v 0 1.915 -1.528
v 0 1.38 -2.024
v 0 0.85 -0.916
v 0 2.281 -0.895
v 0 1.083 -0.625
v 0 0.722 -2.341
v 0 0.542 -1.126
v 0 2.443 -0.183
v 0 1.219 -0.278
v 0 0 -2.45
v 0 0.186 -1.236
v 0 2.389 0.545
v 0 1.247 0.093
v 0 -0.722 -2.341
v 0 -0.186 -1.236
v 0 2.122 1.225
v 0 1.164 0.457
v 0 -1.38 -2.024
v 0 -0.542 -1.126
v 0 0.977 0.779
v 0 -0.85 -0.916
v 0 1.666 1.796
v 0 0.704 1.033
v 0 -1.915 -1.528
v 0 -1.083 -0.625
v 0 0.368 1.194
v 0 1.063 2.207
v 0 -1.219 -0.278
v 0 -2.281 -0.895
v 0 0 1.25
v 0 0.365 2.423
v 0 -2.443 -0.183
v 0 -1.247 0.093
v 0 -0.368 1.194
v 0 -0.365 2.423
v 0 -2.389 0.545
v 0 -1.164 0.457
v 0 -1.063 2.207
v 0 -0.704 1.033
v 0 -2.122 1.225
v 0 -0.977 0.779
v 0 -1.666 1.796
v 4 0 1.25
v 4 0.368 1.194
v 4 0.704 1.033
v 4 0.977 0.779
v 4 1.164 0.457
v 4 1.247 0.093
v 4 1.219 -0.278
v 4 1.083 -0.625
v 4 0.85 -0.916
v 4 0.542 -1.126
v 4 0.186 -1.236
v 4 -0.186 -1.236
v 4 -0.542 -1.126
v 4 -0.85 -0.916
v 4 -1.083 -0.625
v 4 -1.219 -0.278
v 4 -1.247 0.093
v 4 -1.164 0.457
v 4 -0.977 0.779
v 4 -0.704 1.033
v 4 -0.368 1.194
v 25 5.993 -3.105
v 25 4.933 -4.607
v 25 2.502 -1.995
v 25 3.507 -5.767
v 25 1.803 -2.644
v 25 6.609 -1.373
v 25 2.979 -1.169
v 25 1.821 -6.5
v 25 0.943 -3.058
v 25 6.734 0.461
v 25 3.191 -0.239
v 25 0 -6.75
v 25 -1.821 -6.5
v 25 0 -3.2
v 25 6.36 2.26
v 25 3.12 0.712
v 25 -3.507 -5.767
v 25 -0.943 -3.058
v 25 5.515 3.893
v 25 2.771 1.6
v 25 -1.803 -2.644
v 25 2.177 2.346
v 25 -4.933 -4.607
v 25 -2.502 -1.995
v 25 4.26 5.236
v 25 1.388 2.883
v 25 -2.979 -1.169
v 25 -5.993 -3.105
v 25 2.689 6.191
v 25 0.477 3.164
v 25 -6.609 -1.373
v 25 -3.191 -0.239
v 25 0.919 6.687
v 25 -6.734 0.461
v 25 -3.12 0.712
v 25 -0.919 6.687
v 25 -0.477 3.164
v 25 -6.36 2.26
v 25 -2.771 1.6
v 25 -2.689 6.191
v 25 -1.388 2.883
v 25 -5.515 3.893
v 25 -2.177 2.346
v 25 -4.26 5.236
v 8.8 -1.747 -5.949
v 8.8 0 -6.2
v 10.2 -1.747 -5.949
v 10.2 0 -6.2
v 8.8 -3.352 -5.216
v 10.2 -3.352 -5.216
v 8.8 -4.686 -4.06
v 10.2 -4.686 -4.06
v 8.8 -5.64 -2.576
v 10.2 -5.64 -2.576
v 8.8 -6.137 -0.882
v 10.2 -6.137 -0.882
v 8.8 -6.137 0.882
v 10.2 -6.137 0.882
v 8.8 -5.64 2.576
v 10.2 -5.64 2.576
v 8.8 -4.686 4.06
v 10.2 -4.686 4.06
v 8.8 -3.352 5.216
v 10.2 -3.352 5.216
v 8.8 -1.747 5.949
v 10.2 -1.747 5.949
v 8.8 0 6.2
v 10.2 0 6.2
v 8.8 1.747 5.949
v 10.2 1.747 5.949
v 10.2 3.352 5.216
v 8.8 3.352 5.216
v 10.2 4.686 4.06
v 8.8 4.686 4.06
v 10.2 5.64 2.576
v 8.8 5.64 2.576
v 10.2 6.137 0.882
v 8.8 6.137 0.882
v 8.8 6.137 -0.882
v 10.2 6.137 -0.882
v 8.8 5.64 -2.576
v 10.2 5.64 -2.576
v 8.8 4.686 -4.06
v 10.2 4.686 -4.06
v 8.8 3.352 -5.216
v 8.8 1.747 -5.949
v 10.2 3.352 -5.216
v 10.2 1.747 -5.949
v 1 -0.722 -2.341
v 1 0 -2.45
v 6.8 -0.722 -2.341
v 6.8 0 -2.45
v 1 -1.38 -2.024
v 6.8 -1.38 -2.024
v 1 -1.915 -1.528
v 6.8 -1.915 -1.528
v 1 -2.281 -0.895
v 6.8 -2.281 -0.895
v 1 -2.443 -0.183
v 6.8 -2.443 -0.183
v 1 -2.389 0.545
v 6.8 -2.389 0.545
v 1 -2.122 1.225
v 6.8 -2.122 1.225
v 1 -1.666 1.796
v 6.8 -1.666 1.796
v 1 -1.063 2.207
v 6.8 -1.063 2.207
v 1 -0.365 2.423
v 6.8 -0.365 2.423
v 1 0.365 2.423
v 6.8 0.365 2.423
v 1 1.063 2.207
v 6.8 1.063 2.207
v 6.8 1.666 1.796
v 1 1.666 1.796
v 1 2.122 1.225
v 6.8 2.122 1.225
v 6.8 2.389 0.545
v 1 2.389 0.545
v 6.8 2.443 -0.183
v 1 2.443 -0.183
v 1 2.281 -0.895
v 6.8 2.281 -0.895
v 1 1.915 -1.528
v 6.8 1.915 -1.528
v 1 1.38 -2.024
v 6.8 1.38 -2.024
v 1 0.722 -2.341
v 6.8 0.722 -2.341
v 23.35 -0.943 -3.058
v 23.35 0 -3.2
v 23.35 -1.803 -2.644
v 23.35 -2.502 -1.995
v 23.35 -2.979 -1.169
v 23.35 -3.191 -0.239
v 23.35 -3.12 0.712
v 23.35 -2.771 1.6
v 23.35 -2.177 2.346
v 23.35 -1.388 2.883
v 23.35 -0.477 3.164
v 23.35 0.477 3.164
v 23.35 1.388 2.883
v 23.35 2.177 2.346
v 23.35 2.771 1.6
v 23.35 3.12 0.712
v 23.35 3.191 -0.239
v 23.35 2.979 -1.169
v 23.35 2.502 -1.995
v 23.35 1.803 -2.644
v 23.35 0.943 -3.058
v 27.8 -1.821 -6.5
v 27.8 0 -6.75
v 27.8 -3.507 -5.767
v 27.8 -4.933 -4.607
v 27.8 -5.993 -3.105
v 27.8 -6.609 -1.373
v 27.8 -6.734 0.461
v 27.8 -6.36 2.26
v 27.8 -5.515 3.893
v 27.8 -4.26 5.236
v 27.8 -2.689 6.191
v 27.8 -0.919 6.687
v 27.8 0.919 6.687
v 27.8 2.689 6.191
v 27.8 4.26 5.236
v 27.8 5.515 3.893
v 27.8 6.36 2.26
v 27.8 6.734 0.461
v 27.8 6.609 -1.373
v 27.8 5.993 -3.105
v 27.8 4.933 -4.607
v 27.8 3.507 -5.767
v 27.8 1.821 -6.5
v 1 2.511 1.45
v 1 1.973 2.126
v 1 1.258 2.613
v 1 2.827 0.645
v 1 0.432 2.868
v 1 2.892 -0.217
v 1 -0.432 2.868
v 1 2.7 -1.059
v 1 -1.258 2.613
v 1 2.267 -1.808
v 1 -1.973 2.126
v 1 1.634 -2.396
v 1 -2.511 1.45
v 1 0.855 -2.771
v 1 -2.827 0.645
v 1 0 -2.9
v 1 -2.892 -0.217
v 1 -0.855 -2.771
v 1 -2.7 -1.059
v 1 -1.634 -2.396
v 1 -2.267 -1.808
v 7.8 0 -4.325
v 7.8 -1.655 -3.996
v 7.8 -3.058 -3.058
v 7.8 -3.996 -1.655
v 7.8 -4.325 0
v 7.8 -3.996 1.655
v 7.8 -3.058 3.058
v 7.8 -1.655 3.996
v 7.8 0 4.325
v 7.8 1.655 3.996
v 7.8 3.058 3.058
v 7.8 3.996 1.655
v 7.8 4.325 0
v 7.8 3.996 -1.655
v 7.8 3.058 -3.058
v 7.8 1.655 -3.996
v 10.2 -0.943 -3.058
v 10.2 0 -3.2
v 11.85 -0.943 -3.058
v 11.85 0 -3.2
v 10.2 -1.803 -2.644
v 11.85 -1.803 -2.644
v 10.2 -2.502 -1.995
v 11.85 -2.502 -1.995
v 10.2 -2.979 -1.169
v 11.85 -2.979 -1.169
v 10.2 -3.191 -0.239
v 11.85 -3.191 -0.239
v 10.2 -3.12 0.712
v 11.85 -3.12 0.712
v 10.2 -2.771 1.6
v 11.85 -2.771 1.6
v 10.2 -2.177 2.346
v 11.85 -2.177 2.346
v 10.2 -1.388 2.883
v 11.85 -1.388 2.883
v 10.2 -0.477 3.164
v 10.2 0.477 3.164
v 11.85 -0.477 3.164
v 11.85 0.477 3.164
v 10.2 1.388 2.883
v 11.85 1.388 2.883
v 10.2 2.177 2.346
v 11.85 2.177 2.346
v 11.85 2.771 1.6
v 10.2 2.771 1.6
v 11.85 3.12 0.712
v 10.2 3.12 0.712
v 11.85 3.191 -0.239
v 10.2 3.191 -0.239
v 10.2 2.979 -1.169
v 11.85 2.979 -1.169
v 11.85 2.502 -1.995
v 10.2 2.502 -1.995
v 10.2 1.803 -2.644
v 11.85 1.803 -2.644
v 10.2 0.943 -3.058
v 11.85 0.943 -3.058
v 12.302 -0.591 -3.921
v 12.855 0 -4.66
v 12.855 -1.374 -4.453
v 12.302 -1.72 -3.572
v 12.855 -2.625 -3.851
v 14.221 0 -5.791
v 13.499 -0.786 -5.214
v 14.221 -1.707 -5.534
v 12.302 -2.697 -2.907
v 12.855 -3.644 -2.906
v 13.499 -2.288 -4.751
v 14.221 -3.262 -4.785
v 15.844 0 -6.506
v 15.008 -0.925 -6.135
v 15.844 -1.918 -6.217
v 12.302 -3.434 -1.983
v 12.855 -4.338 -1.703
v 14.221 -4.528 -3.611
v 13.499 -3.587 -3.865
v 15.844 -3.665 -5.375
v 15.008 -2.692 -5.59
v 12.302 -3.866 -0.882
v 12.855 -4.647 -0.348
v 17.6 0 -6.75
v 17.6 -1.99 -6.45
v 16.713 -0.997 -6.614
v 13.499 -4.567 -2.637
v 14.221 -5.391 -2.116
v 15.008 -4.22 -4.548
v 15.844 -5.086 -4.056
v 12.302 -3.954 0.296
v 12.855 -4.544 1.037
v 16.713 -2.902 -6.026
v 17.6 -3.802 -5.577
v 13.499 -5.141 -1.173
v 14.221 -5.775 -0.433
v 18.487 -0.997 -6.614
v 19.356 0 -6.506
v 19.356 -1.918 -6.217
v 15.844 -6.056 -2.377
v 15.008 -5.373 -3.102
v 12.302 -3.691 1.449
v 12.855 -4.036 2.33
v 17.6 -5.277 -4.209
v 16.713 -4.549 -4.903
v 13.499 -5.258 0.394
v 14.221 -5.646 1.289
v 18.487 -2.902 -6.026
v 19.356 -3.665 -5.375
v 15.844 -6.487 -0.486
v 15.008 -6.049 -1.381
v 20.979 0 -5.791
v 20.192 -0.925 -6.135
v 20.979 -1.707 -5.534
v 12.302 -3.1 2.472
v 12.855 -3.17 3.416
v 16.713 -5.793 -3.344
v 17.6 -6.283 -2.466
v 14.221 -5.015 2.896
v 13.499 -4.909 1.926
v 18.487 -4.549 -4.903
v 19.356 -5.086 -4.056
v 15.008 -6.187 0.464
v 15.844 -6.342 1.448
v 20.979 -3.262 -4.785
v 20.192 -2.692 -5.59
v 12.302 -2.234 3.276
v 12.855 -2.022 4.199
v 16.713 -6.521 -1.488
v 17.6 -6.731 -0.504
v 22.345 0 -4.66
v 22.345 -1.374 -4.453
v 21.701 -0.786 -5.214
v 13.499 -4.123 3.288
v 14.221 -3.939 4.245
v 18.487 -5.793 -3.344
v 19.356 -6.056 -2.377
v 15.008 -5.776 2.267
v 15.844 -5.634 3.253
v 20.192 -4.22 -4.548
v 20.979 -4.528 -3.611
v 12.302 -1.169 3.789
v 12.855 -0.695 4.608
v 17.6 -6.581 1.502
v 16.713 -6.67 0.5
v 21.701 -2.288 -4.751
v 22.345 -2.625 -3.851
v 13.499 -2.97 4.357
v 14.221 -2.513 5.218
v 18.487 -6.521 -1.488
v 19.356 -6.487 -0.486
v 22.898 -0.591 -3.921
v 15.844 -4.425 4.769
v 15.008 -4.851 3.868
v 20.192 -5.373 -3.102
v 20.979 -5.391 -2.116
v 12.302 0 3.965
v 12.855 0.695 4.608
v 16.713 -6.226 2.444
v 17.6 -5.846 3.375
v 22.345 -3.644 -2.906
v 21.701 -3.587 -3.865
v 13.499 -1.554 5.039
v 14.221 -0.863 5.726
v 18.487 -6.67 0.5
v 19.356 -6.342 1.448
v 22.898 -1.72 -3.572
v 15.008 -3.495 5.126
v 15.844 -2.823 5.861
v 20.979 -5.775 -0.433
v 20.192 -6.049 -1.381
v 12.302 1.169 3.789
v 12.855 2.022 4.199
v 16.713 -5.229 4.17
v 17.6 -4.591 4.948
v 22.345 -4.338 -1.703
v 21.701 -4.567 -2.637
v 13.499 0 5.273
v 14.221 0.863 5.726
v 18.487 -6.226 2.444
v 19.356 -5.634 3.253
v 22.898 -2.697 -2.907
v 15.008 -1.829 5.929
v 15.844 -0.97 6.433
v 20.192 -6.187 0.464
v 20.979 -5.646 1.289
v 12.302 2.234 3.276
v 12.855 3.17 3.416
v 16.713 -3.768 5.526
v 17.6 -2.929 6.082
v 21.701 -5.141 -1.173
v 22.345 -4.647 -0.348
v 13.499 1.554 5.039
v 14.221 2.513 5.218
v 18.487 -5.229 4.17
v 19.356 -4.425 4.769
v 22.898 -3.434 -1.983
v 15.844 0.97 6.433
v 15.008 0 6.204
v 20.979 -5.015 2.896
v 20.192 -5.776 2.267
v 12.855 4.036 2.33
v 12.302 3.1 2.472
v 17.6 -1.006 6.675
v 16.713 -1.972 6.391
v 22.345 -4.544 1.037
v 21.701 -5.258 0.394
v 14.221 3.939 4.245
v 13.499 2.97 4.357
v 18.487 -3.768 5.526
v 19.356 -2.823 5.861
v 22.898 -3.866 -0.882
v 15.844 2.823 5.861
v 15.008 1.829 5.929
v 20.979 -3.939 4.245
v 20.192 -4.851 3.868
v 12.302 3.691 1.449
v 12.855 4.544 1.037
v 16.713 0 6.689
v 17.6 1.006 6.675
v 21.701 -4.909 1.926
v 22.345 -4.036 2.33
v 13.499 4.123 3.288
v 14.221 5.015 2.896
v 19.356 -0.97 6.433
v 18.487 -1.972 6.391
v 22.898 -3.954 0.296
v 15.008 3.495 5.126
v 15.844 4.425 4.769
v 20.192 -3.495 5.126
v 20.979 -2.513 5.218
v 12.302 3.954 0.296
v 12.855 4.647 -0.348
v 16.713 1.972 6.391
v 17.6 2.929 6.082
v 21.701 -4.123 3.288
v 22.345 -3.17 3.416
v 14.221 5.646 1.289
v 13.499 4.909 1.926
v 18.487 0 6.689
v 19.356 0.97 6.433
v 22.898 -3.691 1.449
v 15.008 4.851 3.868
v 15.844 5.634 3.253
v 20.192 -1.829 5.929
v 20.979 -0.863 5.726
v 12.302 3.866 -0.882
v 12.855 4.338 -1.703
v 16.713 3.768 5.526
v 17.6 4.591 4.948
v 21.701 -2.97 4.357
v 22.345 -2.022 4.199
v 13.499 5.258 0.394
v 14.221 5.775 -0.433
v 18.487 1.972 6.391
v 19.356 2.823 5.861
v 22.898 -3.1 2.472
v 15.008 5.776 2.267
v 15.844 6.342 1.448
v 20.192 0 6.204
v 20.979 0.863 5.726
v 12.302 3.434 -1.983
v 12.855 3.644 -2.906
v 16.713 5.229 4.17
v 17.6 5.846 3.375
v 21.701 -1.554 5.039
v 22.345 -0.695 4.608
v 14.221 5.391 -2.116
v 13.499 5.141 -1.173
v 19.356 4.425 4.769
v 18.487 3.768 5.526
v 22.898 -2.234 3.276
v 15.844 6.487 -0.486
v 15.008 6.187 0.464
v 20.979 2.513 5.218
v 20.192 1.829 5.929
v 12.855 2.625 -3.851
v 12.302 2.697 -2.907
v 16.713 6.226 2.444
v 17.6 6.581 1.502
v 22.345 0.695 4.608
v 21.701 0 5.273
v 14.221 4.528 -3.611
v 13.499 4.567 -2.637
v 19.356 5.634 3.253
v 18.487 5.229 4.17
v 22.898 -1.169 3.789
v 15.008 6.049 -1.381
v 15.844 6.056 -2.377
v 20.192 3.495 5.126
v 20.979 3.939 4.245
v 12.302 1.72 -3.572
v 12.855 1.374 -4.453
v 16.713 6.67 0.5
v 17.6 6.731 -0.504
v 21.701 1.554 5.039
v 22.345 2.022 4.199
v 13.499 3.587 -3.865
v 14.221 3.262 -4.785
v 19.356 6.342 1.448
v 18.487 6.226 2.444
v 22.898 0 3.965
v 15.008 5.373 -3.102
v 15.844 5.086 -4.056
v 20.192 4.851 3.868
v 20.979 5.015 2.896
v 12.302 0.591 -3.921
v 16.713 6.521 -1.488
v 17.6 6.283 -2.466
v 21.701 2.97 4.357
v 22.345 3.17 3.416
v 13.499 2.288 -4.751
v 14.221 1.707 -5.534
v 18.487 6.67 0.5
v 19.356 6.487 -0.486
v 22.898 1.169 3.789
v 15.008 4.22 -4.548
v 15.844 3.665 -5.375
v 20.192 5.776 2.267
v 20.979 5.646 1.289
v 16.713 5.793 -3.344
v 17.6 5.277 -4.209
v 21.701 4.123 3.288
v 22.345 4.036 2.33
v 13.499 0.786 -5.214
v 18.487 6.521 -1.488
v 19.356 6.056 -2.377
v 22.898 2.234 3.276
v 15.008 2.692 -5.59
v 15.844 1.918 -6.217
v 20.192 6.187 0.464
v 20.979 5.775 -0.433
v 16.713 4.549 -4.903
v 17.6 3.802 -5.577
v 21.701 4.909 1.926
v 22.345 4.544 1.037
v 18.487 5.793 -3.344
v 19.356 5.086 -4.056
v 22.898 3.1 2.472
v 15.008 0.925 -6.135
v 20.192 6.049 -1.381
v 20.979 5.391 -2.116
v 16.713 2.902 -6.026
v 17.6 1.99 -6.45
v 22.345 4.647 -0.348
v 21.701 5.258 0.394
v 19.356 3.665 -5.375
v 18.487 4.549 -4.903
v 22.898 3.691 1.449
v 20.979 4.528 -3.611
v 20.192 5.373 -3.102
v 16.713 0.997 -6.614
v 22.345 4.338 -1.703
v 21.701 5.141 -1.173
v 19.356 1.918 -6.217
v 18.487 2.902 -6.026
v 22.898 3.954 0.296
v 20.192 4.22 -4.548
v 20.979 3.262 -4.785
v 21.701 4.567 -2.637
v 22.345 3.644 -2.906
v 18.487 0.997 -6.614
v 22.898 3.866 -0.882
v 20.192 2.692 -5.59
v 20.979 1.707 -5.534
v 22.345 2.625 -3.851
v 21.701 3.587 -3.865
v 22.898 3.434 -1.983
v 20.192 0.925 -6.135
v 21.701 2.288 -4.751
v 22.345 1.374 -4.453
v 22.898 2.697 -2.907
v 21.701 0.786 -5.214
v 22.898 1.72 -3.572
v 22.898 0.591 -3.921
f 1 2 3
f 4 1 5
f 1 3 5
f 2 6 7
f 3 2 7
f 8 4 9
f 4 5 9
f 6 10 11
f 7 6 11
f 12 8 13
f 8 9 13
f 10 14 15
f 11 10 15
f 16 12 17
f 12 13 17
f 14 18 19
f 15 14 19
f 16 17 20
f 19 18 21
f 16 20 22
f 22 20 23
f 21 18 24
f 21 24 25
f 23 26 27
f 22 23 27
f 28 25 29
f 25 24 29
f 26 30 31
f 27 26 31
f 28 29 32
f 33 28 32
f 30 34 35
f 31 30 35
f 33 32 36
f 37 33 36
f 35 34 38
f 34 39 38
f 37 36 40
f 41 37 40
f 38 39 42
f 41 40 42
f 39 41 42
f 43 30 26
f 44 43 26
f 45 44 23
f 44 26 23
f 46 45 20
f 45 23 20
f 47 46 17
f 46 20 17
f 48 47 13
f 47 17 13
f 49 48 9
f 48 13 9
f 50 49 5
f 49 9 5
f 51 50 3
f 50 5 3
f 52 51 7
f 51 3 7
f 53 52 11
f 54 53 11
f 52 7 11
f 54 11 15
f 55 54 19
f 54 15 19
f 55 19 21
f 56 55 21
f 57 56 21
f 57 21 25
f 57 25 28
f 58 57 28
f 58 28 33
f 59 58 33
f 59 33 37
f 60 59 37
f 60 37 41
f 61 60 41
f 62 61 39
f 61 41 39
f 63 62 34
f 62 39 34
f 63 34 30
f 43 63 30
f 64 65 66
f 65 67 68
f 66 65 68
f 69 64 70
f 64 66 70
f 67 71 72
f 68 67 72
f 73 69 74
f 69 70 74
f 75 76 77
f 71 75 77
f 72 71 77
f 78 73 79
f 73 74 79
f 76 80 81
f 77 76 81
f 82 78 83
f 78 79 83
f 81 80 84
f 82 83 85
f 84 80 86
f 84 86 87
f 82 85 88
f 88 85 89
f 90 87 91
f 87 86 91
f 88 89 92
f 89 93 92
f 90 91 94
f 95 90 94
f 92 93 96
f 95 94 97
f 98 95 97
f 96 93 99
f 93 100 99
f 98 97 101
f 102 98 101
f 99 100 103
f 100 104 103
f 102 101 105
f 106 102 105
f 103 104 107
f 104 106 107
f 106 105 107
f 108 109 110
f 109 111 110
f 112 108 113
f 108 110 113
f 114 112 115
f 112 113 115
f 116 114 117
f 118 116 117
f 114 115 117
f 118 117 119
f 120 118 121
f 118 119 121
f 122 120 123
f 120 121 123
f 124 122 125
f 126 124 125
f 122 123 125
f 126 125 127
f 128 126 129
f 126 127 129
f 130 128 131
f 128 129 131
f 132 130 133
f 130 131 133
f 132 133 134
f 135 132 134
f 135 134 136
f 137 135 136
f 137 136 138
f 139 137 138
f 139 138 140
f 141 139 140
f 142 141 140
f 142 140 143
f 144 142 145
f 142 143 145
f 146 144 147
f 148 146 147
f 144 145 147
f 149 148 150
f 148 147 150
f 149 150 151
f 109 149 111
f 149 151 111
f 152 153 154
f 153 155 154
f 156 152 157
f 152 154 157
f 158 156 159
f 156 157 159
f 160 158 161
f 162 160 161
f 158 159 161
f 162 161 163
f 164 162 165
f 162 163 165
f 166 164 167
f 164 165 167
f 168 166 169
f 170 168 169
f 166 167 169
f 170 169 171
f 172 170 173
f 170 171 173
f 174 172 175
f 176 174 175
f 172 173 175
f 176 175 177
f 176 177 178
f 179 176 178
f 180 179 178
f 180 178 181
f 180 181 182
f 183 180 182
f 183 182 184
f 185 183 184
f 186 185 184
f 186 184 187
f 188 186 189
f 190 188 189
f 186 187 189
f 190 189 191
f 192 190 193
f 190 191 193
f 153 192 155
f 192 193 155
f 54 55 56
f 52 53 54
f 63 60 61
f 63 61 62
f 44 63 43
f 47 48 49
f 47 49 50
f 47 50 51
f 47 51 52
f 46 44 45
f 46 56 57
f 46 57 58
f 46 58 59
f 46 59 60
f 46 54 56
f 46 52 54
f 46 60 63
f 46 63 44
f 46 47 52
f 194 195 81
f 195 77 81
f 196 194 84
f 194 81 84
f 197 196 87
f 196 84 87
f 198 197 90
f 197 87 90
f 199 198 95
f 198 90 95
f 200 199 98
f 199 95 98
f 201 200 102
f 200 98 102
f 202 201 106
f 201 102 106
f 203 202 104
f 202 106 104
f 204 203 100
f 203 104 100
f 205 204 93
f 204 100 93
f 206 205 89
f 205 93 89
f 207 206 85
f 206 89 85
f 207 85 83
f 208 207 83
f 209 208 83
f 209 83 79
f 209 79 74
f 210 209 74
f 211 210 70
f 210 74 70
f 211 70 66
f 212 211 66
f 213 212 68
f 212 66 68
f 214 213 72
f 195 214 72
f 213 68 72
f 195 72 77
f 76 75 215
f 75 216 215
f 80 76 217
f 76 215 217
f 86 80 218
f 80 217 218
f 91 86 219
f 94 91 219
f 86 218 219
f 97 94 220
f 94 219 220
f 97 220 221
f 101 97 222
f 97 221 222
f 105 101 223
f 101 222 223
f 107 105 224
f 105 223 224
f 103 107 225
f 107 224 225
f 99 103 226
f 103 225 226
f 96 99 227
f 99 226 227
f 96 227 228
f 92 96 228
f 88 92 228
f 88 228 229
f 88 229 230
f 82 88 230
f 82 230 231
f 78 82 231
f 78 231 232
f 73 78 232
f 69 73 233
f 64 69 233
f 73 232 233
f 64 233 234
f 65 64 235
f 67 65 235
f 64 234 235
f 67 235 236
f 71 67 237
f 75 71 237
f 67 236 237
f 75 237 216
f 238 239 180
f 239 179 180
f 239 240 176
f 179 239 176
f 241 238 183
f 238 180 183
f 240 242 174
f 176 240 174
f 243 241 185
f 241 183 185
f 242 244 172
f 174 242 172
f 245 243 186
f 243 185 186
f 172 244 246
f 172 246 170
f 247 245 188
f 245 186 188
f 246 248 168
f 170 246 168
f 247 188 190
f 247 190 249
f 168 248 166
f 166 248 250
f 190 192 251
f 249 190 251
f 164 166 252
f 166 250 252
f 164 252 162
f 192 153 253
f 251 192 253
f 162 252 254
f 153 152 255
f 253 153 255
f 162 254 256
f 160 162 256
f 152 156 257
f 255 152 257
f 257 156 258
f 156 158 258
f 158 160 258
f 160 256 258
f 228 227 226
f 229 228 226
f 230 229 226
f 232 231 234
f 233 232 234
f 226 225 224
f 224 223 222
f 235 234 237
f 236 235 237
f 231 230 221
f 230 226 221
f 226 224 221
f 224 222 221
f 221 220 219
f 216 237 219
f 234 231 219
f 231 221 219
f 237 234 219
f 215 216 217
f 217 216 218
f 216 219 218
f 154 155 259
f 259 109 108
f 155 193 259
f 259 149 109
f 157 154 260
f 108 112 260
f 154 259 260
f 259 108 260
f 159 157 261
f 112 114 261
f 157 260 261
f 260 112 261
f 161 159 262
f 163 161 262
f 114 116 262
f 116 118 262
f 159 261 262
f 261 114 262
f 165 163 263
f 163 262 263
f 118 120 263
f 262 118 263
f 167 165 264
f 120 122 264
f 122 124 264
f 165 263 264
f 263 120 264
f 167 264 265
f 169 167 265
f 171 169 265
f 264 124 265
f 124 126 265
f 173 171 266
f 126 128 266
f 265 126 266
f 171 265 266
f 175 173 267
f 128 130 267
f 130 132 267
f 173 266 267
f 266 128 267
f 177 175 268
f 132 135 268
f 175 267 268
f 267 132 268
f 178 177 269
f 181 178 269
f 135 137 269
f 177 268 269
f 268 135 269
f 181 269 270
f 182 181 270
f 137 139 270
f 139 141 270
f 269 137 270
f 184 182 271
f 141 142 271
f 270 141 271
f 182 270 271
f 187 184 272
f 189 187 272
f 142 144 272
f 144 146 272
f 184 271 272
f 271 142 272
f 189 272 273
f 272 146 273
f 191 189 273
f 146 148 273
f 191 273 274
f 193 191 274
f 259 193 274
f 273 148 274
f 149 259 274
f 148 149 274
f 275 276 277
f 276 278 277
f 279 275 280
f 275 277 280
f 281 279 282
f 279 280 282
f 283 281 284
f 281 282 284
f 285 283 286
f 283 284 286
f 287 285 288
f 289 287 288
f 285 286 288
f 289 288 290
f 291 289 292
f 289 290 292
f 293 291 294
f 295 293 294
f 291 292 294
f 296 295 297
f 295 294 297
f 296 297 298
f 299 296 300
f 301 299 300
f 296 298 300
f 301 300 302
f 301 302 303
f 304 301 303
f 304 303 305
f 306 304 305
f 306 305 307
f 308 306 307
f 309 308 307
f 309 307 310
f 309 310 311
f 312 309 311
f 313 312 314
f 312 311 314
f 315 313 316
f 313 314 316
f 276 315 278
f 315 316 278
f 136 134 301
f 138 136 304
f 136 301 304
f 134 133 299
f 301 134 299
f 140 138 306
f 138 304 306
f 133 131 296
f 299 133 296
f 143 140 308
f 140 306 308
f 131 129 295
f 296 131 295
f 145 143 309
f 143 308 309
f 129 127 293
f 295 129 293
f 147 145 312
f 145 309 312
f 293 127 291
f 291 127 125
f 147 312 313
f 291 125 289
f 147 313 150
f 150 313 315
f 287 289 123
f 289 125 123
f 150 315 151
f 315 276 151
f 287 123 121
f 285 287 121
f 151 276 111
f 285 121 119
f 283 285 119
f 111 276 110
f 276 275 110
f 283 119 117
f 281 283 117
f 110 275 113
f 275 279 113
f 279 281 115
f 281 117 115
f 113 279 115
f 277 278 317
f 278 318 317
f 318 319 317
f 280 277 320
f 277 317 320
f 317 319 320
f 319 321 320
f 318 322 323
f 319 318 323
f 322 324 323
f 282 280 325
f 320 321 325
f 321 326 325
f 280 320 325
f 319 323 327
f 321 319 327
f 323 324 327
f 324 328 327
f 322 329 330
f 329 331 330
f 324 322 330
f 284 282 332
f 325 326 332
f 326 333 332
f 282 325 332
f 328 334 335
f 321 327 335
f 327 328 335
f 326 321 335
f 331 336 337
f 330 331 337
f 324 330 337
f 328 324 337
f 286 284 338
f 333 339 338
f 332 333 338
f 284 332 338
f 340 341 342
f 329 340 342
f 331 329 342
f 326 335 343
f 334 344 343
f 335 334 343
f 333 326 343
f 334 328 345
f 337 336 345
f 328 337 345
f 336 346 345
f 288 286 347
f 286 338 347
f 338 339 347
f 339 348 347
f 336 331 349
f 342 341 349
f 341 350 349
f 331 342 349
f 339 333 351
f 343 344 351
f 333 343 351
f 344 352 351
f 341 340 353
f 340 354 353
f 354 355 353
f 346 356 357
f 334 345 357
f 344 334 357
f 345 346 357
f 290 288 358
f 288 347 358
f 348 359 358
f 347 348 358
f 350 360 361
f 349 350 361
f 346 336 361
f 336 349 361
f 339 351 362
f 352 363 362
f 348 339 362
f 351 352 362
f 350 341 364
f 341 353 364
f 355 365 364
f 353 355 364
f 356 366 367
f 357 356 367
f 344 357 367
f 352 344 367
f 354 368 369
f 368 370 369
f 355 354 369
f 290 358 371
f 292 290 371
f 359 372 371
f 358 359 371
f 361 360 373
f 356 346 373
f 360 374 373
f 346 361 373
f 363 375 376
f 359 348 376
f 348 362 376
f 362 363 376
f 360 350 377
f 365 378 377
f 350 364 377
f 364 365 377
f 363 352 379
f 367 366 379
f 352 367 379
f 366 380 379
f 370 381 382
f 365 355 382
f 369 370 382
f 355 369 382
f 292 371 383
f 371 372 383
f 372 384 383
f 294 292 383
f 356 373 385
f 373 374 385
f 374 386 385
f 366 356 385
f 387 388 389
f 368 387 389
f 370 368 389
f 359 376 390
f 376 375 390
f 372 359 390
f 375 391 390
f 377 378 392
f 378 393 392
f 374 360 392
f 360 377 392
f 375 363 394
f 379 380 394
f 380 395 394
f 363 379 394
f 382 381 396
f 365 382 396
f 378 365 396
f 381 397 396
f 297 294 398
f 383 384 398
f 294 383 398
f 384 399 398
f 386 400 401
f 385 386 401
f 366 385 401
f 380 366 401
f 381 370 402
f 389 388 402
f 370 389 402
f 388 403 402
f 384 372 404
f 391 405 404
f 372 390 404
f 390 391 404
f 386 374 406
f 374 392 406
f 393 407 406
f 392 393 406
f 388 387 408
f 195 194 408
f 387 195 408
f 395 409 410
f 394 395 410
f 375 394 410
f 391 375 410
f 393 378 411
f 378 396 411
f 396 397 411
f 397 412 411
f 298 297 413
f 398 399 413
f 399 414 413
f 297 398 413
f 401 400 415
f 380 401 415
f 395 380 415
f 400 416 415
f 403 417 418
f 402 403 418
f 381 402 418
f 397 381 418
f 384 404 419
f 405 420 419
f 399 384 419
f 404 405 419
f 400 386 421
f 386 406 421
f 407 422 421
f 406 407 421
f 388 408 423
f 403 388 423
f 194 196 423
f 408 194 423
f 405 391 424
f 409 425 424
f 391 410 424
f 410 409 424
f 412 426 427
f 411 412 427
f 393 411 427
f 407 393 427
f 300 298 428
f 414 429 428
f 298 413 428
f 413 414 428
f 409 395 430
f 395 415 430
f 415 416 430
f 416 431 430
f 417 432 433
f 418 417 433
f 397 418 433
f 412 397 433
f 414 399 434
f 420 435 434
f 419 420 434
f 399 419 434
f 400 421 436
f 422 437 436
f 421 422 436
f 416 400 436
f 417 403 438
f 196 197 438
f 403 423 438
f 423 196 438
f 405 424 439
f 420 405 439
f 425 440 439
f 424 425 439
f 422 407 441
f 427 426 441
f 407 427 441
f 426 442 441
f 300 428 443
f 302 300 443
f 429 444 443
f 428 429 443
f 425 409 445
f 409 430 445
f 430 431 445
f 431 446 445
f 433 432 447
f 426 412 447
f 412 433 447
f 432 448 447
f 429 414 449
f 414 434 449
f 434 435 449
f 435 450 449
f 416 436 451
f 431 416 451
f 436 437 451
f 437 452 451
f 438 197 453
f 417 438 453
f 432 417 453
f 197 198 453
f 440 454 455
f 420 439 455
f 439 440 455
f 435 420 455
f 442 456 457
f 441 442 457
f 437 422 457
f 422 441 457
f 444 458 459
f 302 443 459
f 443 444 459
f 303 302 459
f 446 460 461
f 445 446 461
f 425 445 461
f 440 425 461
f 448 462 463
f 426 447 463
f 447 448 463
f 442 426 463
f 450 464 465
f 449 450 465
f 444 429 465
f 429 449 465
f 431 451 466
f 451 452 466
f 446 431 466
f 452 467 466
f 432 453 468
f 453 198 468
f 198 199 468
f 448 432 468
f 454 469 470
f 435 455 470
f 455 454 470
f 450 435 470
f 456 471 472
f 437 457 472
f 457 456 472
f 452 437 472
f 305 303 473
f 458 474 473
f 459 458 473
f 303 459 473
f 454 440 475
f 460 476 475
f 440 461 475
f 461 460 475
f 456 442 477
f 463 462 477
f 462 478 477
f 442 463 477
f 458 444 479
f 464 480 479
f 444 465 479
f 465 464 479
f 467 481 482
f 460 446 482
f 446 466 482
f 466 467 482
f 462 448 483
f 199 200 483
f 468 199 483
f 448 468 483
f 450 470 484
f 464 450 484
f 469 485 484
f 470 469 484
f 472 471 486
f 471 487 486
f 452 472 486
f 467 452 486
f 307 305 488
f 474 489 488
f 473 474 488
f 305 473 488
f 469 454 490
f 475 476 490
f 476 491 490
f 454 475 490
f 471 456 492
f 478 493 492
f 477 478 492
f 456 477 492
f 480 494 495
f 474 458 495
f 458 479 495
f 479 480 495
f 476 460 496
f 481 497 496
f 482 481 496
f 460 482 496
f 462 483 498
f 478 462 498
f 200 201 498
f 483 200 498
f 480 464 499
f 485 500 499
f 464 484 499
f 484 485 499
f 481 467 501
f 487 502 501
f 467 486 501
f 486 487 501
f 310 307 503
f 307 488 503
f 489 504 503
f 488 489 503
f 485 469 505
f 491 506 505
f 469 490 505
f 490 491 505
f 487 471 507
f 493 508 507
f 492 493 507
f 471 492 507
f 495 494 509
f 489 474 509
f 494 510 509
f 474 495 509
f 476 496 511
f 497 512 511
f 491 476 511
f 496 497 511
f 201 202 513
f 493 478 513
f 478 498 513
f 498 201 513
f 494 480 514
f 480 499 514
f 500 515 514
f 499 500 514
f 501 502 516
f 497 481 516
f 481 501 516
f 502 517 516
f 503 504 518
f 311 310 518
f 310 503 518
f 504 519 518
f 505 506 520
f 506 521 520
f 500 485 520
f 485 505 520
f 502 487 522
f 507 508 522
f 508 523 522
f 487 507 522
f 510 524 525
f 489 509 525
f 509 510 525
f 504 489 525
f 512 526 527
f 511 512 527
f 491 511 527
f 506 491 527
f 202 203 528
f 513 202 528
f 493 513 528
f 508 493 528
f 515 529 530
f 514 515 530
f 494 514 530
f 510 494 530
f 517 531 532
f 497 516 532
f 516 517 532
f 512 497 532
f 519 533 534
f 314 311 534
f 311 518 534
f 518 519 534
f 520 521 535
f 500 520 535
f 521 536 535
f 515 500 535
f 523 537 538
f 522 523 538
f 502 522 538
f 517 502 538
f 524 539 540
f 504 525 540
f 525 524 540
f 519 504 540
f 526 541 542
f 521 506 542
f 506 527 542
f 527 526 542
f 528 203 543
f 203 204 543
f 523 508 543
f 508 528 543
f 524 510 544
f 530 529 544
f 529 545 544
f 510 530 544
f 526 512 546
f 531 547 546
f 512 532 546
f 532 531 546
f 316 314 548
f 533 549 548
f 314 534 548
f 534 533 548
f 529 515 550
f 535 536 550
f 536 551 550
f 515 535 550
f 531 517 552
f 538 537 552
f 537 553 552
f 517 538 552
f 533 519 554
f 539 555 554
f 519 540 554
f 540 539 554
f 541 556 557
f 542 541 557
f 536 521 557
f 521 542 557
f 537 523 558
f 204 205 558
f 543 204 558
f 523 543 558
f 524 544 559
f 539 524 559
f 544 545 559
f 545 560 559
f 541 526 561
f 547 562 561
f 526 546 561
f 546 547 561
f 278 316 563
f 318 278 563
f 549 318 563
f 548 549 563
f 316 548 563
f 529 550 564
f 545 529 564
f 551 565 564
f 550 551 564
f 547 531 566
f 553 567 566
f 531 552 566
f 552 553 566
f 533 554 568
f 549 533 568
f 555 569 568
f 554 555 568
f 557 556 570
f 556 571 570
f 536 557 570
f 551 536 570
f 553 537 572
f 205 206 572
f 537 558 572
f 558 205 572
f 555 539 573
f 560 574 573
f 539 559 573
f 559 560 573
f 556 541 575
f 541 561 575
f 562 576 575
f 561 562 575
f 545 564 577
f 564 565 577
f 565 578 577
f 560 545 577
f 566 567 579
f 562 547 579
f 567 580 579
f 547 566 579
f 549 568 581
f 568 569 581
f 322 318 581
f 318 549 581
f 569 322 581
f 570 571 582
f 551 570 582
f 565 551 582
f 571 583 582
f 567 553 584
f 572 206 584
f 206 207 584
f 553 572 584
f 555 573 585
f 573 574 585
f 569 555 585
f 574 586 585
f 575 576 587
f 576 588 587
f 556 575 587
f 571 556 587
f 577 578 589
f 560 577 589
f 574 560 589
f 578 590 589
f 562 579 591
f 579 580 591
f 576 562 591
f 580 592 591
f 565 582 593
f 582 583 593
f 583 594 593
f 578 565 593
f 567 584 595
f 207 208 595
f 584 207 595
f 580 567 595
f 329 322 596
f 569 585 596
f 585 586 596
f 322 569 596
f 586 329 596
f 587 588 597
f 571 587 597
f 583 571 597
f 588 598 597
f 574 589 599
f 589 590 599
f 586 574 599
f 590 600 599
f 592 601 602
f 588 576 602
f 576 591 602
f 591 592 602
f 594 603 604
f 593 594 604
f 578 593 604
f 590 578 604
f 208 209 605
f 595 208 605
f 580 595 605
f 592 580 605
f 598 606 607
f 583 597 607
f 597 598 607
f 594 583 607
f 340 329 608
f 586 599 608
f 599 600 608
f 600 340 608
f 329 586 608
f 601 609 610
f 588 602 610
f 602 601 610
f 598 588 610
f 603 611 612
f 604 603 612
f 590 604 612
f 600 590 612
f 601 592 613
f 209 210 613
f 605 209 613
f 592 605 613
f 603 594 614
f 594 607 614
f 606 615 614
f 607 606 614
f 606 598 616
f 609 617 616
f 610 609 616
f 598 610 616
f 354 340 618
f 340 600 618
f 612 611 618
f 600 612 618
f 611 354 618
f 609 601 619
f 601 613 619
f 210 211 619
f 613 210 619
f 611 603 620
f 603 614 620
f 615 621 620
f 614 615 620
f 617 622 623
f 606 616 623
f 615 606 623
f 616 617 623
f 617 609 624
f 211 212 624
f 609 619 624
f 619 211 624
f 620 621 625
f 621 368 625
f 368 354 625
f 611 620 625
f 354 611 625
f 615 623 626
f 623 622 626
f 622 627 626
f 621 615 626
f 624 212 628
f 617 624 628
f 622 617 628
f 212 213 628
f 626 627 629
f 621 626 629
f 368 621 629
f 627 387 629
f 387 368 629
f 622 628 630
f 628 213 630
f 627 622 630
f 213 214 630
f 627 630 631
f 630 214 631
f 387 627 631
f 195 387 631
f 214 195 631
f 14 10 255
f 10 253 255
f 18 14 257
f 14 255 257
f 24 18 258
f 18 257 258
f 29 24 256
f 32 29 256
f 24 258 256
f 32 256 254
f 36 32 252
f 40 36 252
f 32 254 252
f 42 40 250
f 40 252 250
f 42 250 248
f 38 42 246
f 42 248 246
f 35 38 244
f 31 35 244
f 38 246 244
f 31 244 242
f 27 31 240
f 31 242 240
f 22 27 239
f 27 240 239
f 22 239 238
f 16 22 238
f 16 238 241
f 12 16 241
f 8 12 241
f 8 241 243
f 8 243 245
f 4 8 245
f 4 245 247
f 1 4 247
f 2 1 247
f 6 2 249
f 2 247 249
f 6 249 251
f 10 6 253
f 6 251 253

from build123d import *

# Parameters (mm, degrees)
IZIM6_R               = 1.25
KES_EKSTR_ZYON1_DEPTH = 4


with BuildPart() as part:
    # Çizim5 → Döndür1 (revolve)
    with BuildSketch(Plane(origin=(0, 0, 0), x_dir=(1, 0, 0), z_dir=(0, 1, 0)), mode=Mode.PRIVATE) as d_nd_r1_sk:
        with BuildLine():
            Line((0, 0), (0, -2.45))
            Line((0, -2.45), (1, -2.9))
            Line((1, -2.9), (1, -2.45))
            Line((1, -2.45), (6.8, -2.45))
            Line((6.8, -2.45), (8.8, -6.2))
            Line((8.8, -6.2), (10.2, -6.2))
            Line((10.2, -6.2), (10.2, -3.2))
            Line((10.2, -3.2), (11.85, -3.2))
            ThreePointArc((11.85, -3.2), (17.6, -6.75), (23.35, -3.2))
            Line((23.35, -3.2), (25, -3.2))
            Line((25, -3.2), (25, -6.75))
            Line((25, -6.75), (27.8, -6.75))
            Line((27.8, -6.75), (27.8, 0))
            Line((27.8, 0), (0, 0))
        make_face()
    revolve(d_nd_r1_sk.sketch.rotate(Axis((27.8, 0, 0), (-1, 0, 0)), 180), axis=Axis((27.8, 0, 0), (-1, 0, 0)))

    # Çizim6 → Kes-Ekstrüzyon1 (cut)
    with BuildSketch(Plane.ZY):
        Circle(IZIM6_R)
    extrude(amount=-KES_EKSTR_ZYON1_DEPTH, mode=Mode.SUBTRACT)


solid = part.part
